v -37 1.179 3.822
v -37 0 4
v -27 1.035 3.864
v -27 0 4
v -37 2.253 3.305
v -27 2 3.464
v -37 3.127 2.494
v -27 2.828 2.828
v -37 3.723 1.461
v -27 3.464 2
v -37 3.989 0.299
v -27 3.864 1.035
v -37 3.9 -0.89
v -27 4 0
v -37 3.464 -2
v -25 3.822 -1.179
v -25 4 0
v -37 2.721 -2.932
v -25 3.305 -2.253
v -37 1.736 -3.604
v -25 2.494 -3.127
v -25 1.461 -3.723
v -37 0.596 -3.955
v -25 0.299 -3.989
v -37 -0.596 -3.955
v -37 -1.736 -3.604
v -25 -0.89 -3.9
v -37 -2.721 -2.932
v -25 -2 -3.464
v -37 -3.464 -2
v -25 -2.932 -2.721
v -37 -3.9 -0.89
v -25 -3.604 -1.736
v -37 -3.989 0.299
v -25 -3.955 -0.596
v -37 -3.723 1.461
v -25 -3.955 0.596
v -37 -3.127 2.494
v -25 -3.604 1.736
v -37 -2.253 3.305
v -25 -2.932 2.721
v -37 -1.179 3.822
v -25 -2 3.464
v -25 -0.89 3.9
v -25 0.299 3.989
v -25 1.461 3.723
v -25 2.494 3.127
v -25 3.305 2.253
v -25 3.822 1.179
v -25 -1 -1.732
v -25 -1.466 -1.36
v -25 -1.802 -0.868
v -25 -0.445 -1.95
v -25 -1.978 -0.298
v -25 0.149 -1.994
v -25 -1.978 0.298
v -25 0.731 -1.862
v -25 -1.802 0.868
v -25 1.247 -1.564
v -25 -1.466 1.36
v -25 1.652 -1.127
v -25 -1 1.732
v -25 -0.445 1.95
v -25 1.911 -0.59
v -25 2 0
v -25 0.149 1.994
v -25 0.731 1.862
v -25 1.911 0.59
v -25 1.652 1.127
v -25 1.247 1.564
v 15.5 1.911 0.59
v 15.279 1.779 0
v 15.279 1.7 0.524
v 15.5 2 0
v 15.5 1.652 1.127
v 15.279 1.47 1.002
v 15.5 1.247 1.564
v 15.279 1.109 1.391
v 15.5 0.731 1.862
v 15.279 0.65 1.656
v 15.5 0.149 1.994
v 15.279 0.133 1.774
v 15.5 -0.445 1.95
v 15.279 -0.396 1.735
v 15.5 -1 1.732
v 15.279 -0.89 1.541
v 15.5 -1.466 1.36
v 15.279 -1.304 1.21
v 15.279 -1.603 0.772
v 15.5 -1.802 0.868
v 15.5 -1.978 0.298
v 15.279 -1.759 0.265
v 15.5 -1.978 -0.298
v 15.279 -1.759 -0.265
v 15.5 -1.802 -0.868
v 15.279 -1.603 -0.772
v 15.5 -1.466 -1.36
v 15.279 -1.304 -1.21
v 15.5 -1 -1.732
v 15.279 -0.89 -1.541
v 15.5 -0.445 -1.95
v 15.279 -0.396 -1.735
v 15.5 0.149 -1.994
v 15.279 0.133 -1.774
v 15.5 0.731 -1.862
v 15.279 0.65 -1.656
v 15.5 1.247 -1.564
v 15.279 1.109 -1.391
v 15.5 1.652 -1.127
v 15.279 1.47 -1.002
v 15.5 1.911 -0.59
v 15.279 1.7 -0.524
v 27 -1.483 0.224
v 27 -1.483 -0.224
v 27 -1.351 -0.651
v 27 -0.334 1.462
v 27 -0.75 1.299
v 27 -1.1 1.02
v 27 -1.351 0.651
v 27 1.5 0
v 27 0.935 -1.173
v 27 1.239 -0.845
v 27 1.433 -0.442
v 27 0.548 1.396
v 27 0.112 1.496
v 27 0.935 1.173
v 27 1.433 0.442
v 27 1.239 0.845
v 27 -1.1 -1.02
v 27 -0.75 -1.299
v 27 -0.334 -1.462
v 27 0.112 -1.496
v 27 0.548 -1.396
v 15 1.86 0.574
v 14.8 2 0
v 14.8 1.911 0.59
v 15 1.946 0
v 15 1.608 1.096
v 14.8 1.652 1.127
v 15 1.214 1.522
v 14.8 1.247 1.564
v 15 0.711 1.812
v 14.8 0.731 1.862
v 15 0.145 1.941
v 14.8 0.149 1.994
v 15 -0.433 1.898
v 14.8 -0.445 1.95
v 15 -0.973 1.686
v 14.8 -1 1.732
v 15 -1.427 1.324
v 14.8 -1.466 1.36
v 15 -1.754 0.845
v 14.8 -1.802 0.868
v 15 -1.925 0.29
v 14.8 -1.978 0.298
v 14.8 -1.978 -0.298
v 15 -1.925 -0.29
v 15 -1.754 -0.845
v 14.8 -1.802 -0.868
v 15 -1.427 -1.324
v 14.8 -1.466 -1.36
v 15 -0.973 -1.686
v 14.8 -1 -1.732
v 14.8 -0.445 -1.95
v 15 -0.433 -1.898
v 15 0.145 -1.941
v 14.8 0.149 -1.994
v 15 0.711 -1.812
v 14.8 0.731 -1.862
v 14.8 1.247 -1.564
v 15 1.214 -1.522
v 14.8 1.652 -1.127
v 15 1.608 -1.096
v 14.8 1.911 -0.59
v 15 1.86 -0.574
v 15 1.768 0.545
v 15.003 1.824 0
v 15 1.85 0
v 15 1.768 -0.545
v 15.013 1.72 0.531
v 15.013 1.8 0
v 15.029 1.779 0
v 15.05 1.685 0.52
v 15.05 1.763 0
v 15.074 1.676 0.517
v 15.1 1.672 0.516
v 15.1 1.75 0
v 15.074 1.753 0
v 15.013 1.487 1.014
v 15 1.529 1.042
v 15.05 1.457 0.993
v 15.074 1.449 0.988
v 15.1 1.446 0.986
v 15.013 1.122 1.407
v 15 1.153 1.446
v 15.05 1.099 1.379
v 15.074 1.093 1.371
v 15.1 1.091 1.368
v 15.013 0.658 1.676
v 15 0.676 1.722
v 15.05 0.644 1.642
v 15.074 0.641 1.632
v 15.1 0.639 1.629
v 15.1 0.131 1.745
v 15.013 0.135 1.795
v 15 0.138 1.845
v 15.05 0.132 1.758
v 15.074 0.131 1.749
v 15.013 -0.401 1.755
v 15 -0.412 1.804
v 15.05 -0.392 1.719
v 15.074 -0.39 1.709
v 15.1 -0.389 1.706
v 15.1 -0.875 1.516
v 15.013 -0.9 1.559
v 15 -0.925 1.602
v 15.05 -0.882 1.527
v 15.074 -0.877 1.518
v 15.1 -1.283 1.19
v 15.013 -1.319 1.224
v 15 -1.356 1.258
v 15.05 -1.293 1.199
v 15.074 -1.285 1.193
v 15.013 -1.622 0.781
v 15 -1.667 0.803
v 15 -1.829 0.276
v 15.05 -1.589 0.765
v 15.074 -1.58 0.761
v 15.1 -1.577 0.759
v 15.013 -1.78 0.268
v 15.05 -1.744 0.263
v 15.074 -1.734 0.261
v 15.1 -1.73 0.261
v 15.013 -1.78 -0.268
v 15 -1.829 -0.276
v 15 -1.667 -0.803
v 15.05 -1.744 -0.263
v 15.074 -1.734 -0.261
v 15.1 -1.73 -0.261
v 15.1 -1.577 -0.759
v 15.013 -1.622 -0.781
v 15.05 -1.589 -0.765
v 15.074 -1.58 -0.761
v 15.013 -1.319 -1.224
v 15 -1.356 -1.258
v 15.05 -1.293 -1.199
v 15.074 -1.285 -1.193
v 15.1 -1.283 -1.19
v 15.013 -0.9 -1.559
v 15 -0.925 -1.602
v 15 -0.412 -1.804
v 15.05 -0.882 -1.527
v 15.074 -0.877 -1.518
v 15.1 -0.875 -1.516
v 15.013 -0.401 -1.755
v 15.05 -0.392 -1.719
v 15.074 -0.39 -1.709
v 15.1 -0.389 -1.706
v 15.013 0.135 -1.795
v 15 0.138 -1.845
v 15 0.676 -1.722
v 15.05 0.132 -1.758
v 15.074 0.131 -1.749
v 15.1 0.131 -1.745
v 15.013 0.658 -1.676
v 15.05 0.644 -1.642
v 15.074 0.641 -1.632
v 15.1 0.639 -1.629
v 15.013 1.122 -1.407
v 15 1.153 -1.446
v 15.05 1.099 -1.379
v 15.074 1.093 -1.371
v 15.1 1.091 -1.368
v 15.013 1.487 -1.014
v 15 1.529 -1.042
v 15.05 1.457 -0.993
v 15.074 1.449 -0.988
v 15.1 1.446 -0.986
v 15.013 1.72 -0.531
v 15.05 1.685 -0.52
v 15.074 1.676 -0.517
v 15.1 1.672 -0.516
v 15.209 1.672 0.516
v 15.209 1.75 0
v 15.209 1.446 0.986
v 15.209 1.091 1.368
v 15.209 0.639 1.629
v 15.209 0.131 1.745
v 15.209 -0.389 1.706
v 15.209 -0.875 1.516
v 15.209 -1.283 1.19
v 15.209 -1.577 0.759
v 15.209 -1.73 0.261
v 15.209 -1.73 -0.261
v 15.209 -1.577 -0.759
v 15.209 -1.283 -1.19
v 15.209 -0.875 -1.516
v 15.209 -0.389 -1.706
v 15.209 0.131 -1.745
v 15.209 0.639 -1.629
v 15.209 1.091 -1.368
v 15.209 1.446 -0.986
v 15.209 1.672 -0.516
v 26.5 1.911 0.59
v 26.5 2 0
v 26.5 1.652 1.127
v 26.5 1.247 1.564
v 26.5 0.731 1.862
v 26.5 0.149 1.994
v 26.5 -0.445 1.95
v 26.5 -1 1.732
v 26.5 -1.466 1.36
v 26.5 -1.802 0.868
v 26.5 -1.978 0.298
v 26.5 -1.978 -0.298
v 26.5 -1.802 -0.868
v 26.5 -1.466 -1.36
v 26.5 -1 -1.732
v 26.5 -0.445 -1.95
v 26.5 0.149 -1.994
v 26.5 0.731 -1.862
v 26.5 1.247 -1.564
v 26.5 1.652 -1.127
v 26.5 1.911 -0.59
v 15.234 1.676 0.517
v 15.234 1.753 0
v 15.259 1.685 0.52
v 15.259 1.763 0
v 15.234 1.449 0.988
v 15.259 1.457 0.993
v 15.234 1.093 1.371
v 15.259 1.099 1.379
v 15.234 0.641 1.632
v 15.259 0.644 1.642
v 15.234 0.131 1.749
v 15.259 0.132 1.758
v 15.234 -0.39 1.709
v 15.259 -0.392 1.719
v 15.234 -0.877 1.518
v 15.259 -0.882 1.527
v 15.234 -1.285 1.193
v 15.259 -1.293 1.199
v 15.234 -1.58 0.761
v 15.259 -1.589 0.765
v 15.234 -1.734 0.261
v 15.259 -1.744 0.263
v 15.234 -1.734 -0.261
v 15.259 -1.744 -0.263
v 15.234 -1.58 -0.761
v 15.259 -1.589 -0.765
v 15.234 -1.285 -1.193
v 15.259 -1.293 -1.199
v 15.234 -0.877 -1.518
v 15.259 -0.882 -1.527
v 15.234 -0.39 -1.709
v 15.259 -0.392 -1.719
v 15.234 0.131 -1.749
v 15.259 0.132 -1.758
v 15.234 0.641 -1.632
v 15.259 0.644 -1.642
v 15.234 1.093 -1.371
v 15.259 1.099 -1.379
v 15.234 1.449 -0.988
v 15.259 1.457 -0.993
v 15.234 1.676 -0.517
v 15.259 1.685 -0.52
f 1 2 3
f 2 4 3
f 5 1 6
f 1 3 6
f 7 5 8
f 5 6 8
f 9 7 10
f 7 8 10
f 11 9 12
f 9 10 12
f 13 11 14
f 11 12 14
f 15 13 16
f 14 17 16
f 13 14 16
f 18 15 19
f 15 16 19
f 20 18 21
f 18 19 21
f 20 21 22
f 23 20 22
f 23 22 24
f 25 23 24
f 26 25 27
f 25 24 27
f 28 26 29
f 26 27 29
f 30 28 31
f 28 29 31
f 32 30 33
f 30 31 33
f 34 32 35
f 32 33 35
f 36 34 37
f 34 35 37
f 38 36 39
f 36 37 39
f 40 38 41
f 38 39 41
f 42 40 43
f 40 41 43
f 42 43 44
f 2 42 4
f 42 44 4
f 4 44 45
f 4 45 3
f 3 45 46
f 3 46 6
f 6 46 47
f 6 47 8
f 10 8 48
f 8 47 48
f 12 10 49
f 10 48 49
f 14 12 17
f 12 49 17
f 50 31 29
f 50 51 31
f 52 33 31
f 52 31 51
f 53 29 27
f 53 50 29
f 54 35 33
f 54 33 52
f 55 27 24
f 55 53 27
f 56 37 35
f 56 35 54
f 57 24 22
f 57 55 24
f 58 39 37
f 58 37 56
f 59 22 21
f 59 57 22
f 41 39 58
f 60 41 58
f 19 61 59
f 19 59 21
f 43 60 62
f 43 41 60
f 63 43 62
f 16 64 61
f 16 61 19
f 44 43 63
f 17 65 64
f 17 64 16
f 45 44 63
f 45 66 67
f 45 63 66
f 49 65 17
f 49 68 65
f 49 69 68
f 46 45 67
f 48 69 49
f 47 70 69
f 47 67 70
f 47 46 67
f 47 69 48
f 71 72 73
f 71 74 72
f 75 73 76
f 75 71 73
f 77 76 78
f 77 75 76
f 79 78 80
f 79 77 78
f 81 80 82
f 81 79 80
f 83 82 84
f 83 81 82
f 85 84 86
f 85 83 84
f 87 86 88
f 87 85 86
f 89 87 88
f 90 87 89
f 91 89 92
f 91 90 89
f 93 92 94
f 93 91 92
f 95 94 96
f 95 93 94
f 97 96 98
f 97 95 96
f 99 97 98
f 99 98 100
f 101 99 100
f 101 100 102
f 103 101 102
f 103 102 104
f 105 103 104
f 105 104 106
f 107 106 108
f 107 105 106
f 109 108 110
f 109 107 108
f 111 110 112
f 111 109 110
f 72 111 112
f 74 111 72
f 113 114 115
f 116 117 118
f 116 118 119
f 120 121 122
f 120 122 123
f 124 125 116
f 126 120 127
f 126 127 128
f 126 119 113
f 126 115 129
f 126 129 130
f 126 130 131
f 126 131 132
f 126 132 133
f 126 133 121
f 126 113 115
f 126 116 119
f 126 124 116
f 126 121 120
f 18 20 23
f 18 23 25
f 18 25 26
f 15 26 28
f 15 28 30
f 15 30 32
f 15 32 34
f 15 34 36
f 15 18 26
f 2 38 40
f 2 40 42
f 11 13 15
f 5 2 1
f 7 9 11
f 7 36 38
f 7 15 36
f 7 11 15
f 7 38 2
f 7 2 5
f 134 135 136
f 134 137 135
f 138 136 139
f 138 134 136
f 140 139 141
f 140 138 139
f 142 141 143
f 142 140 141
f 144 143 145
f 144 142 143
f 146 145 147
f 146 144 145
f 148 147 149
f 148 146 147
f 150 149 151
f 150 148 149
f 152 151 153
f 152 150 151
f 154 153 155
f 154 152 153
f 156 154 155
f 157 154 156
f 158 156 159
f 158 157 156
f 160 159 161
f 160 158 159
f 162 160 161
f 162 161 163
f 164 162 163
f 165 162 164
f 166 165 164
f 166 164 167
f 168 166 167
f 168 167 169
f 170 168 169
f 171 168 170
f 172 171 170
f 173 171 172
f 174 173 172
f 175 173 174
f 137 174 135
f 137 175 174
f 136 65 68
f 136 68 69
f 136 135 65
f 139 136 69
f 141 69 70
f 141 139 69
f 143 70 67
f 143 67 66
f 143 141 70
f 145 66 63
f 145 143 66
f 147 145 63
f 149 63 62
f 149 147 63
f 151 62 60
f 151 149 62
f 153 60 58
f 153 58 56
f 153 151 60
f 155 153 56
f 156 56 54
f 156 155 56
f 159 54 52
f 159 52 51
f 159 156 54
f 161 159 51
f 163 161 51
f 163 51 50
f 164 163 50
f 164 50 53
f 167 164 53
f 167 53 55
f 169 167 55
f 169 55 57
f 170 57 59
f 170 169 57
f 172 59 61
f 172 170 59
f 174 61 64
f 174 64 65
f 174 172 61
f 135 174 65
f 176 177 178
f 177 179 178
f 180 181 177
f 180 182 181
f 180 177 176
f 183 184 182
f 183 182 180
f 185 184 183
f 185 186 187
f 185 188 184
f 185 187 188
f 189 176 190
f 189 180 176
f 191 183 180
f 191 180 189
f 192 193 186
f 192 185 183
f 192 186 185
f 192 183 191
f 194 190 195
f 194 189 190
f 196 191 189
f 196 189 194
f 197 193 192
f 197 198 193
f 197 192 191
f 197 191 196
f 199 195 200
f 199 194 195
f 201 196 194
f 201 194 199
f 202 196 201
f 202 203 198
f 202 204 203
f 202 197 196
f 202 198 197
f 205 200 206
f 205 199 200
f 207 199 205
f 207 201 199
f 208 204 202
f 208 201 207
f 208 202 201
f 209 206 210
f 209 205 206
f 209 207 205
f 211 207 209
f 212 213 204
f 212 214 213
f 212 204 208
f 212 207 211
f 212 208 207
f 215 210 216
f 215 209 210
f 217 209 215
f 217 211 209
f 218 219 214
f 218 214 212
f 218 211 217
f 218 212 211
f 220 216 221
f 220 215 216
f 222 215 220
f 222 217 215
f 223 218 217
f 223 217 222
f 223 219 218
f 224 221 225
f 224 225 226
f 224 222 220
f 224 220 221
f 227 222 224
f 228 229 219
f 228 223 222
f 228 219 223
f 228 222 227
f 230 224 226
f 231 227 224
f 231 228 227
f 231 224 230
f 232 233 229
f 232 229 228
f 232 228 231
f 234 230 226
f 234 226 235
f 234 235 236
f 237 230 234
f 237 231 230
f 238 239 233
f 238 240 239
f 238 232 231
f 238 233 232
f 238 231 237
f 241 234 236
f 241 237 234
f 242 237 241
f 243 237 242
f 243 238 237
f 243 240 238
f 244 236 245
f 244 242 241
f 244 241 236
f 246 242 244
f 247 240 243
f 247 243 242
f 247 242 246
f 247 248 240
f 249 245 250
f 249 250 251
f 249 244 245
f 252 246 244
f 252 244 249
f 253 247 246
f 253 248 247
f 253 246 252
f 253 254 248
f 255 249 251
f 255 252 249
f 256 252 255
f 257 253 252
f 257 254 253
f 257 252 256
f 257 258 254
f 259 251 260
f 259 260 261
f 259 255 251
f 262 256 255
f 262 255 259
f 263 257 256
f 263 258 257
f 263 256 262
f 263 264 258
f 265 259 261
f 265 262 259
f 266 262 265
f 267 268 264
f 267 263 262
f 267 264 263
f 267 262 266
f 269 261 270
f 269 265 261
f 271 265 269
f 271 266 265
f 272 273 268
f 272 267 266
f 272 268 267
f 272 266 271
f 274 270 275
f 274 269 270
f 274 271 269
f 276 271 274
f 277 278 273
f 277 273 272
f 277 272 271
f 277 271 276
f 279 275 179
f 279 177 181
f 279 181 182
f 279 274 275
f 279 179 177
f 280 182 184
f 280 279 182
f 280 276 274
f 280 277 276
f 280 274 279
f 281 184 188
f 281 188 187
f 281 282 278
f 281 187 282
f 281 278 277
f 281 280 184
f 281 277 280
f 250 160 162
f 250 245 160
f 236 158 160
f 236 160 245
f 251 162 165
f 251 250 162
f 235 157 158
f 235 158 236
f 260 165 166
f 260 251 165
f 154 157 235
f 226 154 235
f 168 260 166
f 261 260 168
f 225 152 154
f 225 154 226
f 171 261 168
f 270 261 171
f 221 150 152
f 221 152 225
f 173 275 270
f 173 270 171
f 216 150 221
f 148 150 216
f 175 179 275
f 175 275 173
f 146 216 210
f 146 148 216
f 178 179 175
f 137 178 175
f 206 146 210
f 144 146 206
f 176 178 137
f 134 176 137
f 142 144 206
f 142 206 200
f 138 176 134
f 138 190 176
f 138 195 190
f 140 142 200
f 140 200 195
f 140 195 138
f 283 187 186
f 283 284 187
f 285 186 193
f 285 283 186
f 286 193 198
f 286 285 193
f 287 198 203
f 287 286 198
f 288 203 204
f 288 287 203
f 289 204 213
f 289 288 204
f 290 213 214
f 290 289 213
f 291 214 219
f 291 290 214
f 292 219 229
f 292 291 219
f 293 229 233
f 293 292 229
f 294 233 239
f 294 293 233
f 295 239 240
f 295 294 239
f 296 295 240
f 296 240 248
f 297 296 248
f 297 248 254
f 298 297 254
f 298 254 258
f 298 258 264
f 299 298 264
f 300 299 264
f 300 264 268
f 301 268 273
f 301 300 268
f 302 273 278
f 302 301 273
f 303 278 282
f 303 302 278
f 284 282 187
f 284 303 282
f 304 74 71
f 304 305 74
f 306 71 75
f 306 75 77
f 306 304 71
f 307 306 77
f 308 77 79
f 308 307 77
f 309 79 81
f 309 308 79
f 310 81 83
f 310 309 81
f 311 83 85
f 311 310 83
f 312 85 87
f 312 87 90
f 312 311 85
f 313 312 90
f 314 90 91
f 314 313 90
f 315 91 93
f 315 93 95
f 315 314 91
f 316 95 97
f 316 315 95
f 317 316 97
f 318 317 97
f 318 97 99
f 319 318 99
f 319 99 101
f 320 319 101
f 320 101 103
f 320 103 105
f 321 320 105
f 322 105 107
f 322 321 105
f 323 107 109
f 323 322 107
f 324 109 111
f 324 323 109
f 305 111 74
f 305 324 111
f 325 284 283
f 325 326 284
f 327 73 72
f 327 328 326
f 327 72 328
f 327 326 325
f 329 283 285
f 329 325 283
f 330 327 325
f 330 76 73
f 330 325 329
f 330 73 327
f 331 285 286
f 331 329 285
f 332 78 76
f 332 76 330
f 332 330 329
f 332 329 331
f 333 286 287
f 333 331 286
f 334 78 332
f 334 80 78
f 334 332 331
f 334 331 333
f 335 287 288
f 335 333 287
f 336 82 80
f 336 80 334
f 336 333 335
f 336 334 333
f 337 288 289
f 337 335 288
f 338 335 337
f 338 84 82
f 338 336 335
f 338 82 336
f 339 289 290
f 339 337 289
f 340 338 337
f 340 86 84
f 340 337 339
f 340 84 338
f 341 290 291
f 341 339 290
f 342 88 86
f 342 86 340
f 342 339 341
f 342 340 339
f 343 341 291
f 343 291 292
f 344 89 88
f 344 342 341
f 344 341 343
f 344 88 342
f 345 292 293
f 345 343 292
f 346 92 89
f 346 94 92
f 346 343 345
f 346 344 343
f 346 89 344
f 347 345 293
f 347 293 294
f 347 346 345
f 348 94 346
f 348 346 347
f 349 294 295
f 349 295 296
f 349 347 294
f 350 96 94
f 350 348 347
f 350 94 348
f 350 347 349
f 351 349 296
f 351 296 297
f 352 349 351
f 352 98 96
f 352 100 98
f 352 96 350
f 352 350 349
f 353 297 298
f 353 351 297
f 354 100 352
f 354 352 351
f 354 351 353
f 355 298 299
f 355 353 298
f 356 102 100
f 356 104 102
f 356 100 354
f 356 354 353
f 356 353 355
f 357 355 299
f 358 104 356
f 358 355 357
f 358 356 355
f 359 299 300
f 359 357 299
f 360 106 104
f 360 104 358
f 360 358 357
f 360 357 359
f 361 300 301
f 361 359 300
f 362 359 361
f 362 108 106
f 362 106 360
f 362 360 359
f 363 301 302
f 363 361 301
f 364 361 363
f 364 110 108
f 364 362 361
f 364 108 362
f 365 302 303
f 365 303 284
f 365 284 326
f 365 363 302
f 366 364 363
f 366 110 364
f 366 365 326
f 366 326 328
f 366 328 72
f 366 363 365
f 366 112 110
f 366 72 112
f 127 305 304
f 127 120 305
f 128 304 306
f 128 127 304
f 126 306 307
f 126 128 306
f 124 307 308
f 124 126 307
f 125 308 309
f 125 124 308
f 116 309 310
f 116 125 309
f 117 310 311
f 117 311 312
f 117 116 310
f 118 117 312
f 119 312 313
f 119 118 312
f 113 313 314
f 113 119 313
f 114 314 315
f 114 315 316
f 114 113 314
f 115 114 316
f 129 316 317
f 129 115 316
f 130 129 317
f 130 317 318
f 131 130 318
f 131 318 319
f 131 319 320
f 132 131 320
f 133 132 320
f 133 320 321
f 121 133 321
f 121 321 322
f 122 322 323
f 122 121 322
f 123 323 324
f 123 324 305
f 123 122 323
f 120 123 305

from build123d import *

# Parameters (mm, degrees)
SKETCH3_R = 4
P_L_DEPTH = 10


with BuildPart() as part:
    # Sketch1 → Revolve1 (revolve)
    with BuildSketch(Plane.XY):
        with BuildLine():
            Line((-25, 2), (14.8, 2))
            Line((14.8, 2), (15, 1.946410162))
            Line((15, 1.946410162), (15, 1.85))
            ThreePointArc((15, 1.85), (15.029289322, 1.779289322), (15.1, 1.75))
            Line((15.1, 1.75), (15.208578644, 1.75))
            ThreePointArc((15.208578644, 1.75), (15.246846987, 1.757612047), (15.279289322, 1.779289322))
            Line((15.279289322, 1.779289322), (15.5, 2))
            Line((15.5, 2), (26.5, 2))
            Line((26.5, 2), (27, 1.5))
            Line((27, 1.5), (27, 0))
            Line((27, 0), (-27, 0))
            Line((-27, 0), (-27, 4))
            Line((-27, 4), (-25, 4))
            Line((-25, 4), (-25, 2))
        make_face()
    revolve(axis=Axis((0, 0, 0), (1, 0, 0)))

    # Sketch3 → P-L (add)
    with BuildSketch(Plane.ZY.offset(27)):
        Circle(SKETCH3_R)
    extrude(amount=P_L_DEPTH)


solid = part.part
